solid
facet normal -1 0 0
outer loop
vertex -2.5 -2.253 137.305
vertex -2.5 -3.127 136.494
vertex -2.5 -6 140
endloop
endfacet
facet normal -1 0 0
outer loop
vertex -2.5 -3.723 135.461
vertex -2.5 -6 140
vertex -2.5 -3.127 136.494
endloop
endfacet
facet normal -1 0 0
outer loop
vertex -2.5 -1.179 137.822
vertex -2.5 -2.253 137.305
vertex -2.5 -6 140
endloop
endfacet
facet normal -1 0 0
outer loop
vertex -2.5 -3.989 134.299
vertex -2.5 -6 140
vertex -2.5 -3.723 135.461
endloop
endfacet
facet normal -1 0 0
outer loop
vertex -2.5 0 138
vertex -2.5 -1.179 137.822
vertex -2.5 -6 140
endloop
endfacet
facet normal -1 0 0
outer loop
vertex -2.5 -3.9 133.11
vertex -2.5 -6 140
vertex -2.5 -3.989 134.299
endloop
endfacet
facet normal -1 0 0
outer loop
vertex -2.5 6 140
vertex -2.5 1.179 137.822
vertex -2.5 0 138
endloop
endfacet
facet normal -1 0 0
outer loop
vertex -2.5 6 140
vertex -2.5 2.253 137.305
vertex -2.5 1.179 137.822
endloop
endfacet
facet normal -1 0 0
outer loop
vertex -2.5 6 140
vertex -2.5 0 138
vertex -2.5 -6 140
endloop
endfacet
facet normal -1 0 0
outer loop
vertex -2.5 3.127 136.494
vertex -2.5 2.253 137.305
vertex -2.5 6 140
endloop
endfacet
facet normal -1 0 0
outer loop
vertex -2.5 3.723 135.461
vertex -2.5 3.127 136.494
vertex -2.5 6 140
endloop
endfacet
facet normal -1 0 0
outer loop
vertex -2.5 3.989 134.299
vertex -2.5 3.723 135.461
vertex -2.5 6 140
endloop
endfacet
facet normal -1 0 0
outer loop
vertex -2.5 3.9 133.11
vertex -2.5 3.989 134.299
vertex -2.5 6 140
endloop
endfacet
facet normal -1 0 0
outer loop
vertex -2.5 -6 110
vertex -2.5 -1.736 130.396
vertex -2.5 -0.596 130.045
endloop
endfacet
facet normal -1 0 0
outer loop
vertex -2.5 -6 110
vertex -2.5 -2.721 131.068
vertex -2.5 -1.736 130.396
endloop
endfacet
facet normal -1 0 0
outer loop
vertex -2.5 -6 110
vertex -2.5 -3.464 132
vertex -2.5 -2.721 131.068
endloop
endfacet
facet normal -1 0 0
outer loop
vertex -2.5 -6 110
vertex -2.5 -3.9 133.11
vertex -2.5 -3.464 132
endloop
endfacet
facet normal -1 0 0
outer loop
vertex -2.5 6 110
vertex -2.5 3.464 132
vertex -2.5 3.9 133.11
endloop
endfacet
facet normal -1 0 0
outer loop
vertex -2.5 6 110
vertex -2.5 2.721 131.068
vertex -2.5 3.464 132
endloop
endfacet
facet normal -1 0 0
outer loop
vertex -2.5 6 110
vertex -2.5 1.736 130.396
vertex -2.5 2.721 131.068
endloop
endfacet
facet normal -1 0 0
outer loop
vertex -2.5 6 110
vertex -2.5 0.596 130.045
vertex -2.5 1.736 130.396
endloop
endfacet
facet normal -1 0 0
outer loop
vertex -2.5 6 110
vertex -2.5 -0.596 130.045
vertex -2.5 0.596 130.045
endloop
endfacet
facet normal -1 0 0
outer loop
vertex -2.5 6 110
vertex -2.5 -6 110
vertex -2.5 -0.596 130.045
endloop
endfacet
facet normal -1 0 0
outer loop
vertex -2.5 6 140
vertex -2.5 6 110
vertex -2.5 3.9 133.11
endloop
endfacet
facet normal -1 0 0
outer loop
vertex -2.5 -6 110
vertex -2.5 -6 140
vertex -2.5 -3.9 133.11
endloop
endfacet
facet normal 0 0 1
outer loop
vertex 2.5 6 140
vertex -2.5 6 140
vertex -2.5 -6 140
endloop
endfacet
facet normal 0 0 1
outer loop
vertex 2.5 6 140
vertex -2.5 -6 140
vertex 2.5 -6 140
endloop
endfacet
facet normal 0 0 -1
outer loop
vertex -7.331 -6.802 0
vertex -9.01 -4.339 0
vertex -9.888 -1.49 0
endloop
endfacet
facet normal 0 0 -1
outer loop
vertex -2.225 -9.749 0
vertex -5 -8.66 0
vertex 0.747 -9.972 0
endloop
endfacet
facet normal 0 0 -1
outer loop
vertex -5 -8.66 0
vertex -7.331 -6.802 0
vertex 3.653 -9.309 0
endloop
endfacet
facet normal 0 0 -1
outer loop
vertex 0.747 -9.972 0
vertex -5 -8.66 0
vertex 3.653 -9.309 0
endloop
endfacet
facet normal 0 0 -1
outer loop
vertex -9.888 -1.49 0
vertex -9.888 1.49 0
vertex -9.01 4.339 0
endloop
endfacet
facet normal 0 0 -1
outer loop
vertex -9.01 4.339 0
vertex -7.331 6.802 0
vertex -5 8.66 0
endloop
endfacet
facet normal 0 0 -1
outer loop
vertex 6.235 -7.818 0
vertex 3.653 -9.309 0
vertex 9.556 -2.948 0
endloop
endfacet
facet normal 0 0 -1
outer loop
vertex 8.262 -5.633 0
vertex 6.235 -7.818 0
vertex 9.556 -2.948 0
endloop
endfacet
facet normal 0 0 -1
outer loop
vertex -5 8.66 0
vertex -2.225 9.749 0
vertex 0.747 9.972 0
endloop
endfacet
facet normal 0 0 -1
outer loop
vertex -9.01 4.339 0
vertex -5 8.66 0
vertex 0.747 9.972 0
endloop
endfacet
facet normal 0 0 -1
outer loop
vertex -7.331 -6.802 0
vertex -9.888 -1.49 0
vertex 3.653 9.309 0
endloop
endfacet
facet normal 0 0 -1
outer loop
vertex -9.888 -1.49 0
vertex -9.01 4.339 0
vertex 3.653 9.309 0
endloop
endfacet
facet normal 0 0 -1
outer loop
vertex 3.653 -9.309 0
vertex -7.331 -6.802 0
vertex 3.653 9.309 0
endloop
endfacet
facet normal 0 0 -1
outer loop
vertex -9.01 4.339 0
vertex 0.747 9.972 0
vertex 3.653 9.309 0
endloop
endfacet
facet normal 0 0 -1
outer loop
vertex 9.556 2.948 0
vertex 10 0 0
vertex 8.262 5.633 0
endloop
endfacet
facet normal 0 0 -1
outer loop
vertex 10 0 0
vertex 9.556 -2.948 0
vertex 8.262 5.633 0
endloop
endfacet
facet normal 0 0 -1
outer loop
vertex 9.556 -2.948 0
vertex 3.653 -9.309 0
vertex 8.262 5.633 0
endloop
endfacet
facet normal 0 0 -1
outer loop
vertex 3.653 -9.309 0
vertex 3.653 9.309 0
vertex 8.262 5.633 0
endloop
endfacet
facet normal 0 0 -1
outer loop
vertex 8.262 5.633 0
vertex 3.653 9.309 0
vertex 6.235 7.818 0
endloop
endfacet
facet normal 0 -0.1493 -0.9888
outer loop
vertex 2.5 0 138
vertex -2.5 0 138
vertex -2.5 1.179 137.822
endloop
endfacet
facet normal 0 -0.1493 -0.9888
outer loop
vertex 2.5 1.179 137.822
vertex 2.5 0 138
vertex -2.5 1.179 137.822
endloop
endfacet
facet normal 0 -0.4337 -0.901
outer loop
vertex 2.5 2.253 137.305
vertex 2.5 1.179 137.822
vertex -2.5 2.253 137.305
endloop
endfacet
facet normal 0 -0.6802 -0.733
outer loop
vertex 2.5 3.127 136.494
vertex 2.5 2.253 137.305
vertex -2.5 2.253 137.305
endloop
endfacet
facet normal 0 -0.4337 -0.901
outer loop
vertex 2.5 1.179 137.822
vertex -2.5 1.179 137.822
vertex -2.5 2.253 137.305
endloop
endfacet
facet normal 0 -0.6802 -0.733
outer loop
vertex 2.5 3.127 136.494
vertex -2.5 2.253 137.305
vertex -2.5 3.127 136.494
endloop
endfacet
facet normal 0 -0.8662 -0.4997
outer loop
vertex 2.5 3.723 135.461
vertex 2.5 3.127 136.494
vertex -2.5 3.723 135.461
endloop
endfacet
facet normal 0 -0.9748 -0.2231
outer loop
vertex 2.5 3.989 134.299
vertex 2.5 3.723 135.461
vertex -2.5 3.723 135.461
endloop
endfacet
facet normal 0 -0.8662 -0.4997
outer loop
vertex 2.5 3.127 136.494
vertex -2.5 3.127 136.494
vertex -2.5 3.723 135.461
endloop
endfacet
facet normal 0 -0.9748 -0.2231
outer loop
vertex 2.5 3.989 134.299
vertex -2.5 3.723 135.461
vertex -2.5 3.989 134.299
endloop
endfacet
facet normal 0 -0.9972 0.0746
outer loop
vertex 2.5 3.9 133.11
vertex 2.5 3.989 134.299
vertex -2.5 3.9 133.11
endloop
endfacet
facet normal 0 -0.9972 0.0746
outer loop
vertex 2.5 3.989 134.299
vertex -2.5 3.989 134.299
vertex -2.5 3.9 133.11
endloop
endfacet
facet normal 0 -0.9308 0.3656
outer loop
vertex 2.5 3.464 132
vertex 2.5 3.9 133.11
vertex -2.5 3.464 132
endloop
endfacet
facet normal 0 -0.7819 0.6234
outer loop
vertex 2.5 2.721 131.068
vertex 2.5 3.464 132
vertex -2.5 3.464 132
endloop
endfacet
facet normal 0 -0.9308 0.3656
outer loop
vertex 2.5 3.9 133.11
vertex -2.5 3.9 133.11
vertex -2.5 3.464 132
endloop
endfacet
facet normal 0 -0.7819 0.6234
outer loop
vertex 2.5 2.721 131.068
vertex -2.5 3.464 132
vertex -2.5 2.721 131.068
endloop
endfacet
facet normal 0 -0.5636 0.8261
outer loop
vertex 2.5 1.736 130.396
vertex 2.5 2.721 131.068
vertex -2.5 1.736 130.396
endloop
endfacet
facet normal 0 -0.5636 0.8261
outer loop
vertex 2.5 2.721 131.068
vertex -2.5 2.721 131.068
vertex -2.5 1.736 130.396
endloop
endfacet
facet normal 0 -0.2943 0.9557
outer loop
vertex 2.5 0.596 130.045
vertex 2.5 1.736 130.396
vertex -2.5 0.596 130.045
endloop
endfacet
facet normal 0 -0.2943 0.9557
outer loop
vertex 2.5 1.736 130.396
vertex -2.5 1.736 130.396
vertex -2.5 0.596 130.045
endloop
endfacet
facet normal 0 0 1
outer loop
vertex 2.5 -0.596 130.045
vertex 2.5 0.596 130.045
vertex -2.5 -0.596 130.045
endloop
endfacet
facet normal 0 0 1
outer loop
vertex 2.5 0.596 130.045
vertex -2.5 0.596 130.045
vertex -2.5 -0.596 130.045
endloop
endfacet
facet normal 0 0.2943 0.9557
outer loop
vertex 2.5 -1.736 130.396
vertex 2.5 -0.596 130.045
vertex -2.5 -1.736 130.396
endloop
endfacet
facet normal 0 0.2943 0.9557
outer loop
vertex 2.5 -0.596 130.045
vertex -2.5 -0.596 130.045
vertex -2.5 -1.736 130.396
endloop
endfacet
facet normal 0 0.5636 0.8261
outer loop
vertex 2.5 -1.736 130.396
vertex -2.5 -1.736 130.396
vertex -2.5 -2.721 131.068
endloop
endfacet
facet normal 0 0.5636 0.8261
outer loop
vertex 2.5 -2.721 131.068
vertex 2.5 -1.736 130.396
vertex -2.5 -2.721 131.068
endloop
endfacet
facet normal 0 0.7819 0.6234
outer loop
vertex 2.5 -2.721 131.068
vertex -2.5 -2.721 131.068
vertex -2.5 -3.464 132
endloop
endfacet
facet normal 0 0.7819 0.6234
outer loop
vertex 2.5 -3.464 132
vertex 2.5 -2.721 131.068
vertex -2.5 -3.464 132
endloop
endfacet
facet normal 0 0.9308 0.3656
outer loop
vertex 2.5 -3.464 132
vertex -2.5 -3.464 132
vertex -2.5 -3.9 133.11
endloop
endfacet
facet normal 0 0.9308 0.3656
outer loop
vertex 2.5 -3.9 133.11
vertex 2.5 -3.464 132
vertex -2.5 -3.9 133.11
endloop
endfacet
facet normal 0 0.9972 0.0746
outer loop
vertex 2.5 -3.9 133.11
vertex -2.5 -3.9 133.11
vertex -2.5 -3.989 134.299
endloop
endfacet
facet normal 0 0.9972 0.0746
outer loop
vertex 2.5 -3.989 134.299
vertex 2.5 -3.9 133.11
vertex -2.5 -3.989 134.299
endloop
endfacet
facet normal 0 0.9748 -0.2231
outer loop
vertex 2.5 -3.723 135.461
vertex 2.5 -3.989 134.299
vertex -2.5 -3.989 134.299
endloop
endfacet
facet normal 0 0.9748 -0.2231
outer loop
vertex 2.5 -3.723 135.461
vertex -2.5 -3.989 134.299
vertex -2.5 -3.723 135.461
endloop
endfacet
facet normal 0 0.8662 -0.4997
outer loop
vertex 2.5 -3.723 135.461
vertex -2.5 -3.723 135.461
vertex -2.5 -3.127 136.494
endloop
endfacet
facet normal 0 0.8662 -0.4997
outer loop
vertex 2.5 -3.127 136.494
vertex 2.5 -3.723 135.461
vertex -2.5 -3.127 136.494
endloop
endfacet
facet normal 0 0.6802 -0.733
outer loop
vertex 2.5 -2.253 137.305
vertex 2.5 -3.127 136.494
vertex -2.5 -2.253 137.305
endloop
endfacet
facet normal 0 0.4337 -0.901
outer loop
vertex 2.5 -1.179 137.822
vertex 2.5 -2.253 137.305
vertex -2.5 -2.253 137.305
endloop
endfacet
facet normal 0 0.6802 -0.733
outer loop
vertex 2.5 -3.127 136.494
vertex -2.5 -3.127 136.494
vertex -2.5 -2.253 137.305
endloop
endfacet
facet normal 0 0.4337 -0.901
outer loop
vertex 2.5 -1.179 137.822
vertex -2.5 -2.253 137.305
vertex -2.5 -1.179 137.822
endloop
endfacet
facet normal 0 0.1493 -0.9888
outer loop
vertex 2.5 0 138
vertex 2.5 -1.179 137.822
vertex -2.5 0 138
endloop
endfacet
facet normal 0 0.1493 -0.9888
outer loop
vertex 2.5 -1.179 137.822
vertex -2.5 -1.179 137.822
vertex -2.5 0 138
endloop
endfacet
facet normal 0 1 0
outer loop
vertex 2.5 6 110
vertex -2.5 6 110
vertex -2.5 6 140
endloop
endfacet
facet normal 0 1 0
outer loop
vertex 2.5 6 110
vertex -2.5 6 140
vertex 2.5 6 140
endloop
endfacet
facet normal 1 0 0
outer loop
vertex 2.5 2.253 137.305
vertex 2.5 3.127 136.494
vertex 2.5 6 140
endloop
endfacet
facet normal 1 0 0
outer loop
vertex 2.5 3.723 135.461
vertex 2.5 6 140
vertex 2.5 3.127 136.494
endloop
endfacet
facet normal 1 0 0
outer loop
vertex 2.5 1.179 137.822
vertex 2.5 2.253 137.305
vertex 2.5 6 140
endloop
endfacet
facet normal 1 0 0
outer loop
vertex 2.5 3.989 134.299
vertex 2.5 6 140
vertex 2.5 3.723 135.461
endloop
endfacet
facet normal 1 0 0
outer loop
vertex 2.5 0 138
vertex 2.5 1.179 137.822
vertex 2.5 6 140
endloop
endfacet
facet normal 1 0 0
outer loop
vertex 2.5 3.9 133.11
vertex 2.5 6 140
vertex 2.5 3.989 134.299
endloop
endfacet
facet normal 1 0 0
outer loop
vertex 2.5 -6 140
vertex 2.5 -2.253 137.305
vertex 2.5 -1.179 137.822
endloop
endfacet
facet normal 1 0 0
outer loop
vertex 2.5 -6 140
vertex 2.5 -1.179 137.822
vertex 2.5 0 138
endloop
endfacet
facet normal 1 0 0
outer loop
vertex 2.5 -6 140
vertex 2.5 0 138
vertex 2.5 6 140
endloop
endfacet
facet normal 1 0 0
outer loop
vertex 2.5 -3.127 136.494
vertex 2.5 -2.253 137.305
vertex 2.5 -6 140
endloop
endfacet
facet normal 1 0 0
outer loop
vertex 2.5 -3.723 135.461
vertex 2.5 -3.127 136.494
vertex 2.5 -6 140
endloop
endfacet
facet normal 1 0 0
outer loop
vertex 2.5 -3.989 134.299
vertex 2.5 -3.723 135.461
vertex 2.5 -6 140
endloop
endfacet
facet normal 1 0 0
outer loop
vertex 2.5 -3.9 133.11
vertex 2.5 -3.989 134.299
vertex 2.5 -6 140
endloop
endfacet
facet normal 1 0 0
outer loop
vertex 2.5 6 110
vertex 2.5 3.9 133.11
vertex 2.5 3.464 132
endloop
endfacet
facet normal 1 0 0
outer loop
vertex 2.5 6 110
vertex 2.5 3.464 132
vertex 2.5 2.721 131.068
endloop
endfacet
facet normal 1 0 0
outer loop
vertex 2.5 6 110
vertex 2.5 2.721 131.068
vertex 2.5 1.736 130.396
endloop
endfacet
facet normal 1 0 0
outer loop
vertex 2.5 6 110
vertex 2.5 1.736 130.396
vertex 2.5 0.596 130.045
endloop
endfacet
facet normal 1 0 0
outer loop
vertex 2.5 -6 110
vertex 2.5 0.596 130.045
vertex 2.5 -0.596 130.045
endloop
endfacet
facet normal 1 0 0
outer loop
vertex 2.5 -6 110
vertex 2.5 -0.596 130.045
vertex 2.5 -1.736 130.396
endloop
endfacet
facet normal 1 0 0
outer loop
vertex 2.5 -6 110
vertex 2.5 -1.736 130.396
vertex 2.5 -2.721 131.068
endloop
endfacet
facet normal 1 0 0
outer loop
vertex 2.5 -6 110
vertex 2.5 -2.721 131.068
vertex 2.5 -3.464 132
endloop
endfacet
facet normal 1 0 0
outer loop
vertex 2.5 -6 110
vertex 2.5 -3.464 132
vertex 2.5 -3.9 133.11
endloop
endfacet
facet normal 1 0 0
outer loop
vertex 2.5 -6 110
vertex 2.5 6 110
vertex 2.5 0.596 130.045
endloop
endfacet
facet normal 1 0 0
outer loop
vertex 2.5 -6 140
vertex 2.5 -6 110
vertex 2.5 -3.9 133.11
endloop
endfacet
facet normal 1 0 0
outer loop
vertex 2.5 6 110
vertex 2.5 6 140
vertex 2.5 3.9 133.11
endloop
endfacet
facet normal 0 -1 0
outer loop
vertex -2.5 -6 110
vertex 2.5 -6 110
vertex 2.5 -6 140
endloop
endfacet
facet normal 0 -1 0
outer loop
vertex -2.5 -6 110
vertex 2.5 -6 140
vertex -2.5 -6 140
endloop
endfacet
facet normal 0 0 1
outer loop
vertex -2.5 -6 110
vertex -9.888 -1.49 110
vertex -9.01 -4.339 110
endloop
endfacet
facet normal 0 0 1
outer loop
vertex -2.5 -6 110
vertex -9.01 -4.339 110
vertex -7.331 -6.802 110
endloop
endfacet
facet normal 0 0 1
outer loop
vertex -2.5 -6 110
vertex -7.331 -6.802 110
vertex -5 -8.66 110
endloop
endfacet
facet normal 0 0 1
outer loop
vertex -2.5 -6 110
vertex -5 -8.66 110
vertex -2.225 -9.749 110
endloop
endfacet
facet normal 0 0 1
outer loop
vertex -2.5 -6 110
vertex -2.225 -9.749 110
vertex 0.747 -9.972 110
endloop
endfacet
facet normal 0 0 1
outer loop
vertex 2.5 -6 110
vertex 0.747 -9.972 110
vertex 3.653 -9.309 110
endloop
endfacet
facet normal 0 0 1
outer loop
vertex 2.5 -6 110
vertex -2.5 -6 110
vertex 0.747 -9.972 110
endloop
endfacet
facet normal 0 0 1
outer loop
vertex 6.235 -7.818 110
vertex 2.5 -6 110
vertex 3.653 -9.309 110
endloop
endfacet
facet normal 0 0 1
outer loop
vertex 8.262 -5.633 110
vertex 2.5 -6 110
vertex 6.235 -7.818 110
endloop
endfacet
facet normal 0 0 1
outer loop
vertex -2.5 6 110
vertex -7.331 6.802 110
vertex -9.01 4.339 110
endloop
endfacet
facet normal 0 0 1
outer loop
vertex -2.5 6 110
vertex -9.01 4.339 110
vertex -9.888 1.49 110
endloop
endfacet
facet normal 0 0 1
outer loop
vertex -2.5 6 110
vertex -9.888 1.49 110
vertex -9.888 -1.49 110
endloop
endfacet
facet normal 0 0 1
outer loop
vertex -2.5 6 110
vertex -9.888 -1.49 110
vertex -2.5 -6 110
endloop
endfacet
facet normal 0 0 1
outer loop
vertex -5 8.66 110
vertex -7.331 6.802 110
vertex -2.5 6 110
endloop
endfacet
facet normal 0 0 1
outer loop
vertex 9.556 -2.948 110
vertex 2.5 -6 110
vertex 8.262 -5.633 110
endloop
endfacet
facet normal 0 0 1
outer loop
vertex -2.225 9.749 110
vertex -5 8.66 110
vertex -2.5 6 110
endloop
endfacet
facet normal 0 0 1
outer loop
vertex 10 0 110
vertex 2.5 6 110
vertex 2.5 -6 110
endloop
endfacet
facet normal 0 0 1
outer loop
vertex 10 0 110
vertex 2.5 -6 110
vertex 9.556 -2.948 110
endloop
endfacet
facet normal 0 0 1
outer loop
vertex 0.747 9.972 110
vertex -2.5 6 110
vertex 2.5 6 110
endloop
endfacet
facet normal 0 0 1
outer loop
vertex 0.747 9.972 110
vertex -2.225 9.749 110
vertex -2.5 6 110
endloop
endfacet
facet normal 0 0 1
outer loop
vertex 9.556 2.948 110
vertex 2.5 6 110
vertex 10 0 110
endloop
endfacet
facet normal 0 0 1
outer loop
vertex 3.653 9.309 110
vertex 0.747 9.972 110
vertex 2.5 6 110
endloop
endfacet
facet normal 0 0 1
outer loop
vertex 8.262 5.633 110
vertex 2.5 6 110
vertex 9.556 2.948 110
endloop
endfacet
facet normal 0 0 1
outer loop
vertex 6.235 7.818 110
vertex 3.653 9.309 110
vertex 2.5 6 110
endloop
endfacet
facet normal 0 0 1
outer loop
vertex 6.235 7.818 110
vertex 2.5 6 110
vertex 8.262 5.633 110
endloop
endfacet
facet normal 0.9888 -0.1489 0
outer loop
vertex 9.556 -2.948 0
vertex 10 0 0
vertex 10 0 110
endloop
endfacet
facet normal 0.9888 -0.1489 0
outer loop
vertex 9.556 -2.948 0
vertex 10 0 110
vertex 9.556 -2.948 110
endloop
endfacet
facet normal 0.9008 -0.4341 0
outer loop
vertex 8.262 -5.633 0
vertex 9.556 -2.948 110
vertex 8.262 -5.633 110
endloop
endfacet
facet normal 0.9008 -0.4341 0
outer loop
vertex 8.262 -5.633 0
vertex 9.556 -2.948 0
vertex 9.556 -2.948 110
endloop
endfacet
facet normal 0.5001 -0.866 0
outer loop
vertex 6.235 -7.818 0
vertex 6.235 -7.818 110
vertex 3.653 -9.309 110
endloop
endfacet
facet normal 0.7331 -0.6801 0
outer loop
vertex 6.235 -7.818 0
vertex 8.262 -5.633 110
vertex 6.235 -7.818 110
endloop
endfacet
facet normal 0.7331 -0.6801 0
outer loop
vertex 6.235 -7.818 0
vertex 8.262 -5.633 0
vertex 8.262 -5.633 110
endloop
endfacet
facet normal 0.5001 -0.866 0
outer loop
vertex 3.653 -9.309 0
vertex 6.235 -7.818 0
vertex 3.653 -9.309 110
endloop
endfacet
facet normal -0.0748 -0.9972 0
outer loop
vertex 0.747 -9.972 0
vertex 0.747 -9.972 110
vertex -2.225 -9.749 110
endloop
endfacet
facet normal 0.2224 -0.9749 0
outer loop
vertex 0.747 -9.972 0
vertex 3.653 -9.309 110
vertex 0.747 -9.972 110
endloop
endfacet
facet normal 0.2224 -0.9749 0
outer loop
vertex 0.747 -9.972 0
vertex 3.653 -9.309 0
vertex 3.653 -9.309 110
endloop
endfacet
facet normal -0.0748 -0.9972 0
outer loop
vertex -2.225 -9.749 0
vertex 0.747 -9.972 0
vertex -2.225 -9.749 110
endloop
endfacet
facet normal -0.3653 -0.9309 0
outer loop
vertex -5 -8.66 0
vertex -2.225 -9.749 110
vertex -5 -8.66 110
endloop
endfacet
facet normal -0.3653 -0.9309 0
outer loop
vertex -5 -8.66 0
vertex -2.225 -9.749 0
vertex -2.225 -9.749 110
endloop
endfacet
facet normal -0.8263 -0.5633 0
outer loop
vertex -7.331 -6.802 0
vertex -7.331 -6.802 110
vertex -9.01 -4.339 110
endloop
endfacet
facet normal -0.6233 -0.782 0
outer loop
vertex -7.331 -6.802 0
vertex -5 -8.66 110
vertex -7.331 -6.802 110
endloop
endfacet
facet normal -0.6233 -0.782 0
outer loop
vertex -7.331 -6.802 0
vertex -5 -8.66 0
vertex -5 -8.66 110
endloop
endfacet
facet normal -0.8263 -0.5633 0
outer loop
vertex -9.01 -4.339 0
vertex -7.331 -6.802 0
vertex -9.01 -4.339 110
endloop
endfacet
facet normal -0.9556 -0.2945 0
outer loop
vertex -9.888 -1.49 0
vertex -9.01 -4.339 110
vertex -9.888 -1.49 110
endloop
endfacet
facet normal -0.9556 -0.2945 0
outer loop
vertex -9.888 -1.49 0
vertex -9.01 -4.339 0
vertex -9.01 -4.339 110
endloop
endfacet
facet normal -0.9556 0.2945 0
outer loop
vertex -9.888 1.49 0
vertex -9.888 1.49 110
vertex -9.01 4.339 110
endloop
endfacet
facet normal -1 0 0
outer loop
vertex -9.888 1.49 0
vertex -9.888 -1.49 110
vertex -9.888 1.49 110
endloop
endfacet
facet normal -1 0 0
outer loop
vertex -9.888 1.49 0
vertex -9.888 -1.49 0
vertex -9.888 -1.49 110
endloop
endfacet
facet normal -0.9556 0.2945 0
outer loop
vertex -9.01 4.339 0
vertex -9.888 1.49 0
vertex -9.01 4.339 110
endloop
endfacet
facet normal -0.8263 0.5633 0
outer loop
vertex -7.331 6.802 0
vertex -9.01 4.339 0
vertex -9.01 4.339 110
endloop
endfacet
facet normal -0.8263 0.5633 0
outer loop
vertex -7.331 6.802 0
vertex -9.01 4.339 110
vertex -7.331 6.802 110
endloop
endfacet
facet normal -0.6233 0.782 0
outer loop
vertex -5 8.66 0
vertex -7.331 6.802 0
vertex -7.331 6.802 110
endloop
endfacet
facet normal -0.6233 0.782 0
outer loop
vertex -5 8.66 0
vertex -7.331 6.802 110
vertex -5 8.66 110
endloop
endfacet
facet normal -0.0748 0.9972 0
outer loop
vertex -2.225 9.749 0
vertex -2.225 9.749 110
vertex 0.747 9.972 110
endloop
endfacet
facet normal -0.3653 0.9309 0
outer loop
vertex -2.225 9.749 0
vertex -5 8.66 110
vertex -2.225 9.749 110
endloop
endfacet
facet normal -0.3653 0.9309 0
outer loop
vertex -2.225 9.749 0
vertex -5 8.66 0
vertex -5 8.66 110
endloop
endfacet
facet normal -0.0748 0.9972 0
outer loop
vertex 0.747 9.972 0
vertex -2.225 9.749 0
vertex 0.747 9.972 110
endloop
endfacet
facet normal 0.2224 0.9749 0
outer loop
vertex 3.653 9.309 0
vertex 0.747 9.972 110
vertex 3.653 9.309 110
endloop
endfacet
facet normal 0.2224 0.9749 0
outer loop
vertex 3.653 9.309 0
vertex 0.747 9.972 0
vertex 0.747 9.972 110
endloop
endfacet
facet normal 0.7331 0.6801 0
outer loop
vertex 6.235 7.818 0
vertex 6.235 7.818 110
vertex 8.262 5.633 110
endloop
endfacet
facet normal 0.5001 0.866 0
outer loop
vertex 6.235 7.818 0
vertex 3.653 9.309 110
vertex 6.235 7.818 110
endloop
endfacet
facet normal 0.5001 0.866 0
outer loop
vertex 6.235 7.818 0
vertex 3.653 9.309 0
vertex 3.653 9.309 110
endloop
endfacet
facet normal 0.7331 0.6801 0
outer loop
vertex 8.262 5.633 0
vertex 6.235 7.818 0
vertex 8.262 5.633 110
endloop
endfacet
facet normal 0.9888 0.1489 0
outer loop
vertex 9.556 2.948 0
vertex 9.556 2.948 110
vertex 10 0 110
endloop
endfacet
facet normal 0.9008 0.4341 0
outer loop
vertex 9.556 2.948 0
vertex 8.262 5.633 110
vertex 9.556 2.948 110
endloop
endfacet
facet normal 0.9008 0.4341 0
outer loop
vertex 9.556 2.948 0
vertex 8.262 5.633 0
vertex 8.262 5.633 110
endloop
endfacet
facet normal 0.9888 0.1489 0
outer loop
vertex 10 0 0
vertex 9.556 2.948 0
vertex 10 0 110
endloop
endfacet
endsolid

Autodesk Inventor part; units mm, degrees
ref_plane "YZ Plane" through (0, 0, 0) normal (1, 0, 0) x (0, 1, 0)
ref_plane "XZ Plane" through (0, 0, 0) normal (0, 1, 0) x (-1, 0, 0)
ref_plane "XY Plane" through (0, 0, 0) normal (0, 0, 1) x (1, 0, 0)
sketch "Boceto1" plane through (0, 0, 0) normal (0, 0, 1) x (1, 0, 0)
  circle A0 centre (0, 0) radius 10
  dimension "d0" = 20
extrude "Extrusión1" add sketch "Boceto1" along normal blind 110
sketch "Boceto2" plane through (0, 0, 110) normal (0, 0, 1) x (1, 0, 0)
  line L0 (2.5, -6) -> (-2.5, -6)
  line L1 (-2.5, -6) -> (-2.5, 6)
  line L2 (-2.5, 6) -> (2.5, 6)
  line L3 (2.5, 6) -> (2.5, -6)
  line L4 (2.5, -6) -> (-2.5, 6) construction
  line L5 (-2.5, -6) -> (2.5, 6) construction
  point P0 (0, 0)
  dimension "d3" = 5
  dimension "d4" = 12
extrude "Extrusión2" add sketch "Boceto2" along normal blind 30
sketch "Boceto3" plane through (-2.5, -6, 110) normal (-1, 0, 0) x (0, 0, 1)
  circle A0 centre (24, 6) radius 4
  line L0 (30, 12) -> (30, 0) projected
  line L1 (0, 12) -> (30, 12) projected
  point P0 (-110, 6)
  dimension "d7" = 8
  dimension "d8" = 6
  dimension "d9" = 6
extrude "Extrusión3" cut sketch "Boceto3" against normal blind 30
properties part number "cil_sierra"
